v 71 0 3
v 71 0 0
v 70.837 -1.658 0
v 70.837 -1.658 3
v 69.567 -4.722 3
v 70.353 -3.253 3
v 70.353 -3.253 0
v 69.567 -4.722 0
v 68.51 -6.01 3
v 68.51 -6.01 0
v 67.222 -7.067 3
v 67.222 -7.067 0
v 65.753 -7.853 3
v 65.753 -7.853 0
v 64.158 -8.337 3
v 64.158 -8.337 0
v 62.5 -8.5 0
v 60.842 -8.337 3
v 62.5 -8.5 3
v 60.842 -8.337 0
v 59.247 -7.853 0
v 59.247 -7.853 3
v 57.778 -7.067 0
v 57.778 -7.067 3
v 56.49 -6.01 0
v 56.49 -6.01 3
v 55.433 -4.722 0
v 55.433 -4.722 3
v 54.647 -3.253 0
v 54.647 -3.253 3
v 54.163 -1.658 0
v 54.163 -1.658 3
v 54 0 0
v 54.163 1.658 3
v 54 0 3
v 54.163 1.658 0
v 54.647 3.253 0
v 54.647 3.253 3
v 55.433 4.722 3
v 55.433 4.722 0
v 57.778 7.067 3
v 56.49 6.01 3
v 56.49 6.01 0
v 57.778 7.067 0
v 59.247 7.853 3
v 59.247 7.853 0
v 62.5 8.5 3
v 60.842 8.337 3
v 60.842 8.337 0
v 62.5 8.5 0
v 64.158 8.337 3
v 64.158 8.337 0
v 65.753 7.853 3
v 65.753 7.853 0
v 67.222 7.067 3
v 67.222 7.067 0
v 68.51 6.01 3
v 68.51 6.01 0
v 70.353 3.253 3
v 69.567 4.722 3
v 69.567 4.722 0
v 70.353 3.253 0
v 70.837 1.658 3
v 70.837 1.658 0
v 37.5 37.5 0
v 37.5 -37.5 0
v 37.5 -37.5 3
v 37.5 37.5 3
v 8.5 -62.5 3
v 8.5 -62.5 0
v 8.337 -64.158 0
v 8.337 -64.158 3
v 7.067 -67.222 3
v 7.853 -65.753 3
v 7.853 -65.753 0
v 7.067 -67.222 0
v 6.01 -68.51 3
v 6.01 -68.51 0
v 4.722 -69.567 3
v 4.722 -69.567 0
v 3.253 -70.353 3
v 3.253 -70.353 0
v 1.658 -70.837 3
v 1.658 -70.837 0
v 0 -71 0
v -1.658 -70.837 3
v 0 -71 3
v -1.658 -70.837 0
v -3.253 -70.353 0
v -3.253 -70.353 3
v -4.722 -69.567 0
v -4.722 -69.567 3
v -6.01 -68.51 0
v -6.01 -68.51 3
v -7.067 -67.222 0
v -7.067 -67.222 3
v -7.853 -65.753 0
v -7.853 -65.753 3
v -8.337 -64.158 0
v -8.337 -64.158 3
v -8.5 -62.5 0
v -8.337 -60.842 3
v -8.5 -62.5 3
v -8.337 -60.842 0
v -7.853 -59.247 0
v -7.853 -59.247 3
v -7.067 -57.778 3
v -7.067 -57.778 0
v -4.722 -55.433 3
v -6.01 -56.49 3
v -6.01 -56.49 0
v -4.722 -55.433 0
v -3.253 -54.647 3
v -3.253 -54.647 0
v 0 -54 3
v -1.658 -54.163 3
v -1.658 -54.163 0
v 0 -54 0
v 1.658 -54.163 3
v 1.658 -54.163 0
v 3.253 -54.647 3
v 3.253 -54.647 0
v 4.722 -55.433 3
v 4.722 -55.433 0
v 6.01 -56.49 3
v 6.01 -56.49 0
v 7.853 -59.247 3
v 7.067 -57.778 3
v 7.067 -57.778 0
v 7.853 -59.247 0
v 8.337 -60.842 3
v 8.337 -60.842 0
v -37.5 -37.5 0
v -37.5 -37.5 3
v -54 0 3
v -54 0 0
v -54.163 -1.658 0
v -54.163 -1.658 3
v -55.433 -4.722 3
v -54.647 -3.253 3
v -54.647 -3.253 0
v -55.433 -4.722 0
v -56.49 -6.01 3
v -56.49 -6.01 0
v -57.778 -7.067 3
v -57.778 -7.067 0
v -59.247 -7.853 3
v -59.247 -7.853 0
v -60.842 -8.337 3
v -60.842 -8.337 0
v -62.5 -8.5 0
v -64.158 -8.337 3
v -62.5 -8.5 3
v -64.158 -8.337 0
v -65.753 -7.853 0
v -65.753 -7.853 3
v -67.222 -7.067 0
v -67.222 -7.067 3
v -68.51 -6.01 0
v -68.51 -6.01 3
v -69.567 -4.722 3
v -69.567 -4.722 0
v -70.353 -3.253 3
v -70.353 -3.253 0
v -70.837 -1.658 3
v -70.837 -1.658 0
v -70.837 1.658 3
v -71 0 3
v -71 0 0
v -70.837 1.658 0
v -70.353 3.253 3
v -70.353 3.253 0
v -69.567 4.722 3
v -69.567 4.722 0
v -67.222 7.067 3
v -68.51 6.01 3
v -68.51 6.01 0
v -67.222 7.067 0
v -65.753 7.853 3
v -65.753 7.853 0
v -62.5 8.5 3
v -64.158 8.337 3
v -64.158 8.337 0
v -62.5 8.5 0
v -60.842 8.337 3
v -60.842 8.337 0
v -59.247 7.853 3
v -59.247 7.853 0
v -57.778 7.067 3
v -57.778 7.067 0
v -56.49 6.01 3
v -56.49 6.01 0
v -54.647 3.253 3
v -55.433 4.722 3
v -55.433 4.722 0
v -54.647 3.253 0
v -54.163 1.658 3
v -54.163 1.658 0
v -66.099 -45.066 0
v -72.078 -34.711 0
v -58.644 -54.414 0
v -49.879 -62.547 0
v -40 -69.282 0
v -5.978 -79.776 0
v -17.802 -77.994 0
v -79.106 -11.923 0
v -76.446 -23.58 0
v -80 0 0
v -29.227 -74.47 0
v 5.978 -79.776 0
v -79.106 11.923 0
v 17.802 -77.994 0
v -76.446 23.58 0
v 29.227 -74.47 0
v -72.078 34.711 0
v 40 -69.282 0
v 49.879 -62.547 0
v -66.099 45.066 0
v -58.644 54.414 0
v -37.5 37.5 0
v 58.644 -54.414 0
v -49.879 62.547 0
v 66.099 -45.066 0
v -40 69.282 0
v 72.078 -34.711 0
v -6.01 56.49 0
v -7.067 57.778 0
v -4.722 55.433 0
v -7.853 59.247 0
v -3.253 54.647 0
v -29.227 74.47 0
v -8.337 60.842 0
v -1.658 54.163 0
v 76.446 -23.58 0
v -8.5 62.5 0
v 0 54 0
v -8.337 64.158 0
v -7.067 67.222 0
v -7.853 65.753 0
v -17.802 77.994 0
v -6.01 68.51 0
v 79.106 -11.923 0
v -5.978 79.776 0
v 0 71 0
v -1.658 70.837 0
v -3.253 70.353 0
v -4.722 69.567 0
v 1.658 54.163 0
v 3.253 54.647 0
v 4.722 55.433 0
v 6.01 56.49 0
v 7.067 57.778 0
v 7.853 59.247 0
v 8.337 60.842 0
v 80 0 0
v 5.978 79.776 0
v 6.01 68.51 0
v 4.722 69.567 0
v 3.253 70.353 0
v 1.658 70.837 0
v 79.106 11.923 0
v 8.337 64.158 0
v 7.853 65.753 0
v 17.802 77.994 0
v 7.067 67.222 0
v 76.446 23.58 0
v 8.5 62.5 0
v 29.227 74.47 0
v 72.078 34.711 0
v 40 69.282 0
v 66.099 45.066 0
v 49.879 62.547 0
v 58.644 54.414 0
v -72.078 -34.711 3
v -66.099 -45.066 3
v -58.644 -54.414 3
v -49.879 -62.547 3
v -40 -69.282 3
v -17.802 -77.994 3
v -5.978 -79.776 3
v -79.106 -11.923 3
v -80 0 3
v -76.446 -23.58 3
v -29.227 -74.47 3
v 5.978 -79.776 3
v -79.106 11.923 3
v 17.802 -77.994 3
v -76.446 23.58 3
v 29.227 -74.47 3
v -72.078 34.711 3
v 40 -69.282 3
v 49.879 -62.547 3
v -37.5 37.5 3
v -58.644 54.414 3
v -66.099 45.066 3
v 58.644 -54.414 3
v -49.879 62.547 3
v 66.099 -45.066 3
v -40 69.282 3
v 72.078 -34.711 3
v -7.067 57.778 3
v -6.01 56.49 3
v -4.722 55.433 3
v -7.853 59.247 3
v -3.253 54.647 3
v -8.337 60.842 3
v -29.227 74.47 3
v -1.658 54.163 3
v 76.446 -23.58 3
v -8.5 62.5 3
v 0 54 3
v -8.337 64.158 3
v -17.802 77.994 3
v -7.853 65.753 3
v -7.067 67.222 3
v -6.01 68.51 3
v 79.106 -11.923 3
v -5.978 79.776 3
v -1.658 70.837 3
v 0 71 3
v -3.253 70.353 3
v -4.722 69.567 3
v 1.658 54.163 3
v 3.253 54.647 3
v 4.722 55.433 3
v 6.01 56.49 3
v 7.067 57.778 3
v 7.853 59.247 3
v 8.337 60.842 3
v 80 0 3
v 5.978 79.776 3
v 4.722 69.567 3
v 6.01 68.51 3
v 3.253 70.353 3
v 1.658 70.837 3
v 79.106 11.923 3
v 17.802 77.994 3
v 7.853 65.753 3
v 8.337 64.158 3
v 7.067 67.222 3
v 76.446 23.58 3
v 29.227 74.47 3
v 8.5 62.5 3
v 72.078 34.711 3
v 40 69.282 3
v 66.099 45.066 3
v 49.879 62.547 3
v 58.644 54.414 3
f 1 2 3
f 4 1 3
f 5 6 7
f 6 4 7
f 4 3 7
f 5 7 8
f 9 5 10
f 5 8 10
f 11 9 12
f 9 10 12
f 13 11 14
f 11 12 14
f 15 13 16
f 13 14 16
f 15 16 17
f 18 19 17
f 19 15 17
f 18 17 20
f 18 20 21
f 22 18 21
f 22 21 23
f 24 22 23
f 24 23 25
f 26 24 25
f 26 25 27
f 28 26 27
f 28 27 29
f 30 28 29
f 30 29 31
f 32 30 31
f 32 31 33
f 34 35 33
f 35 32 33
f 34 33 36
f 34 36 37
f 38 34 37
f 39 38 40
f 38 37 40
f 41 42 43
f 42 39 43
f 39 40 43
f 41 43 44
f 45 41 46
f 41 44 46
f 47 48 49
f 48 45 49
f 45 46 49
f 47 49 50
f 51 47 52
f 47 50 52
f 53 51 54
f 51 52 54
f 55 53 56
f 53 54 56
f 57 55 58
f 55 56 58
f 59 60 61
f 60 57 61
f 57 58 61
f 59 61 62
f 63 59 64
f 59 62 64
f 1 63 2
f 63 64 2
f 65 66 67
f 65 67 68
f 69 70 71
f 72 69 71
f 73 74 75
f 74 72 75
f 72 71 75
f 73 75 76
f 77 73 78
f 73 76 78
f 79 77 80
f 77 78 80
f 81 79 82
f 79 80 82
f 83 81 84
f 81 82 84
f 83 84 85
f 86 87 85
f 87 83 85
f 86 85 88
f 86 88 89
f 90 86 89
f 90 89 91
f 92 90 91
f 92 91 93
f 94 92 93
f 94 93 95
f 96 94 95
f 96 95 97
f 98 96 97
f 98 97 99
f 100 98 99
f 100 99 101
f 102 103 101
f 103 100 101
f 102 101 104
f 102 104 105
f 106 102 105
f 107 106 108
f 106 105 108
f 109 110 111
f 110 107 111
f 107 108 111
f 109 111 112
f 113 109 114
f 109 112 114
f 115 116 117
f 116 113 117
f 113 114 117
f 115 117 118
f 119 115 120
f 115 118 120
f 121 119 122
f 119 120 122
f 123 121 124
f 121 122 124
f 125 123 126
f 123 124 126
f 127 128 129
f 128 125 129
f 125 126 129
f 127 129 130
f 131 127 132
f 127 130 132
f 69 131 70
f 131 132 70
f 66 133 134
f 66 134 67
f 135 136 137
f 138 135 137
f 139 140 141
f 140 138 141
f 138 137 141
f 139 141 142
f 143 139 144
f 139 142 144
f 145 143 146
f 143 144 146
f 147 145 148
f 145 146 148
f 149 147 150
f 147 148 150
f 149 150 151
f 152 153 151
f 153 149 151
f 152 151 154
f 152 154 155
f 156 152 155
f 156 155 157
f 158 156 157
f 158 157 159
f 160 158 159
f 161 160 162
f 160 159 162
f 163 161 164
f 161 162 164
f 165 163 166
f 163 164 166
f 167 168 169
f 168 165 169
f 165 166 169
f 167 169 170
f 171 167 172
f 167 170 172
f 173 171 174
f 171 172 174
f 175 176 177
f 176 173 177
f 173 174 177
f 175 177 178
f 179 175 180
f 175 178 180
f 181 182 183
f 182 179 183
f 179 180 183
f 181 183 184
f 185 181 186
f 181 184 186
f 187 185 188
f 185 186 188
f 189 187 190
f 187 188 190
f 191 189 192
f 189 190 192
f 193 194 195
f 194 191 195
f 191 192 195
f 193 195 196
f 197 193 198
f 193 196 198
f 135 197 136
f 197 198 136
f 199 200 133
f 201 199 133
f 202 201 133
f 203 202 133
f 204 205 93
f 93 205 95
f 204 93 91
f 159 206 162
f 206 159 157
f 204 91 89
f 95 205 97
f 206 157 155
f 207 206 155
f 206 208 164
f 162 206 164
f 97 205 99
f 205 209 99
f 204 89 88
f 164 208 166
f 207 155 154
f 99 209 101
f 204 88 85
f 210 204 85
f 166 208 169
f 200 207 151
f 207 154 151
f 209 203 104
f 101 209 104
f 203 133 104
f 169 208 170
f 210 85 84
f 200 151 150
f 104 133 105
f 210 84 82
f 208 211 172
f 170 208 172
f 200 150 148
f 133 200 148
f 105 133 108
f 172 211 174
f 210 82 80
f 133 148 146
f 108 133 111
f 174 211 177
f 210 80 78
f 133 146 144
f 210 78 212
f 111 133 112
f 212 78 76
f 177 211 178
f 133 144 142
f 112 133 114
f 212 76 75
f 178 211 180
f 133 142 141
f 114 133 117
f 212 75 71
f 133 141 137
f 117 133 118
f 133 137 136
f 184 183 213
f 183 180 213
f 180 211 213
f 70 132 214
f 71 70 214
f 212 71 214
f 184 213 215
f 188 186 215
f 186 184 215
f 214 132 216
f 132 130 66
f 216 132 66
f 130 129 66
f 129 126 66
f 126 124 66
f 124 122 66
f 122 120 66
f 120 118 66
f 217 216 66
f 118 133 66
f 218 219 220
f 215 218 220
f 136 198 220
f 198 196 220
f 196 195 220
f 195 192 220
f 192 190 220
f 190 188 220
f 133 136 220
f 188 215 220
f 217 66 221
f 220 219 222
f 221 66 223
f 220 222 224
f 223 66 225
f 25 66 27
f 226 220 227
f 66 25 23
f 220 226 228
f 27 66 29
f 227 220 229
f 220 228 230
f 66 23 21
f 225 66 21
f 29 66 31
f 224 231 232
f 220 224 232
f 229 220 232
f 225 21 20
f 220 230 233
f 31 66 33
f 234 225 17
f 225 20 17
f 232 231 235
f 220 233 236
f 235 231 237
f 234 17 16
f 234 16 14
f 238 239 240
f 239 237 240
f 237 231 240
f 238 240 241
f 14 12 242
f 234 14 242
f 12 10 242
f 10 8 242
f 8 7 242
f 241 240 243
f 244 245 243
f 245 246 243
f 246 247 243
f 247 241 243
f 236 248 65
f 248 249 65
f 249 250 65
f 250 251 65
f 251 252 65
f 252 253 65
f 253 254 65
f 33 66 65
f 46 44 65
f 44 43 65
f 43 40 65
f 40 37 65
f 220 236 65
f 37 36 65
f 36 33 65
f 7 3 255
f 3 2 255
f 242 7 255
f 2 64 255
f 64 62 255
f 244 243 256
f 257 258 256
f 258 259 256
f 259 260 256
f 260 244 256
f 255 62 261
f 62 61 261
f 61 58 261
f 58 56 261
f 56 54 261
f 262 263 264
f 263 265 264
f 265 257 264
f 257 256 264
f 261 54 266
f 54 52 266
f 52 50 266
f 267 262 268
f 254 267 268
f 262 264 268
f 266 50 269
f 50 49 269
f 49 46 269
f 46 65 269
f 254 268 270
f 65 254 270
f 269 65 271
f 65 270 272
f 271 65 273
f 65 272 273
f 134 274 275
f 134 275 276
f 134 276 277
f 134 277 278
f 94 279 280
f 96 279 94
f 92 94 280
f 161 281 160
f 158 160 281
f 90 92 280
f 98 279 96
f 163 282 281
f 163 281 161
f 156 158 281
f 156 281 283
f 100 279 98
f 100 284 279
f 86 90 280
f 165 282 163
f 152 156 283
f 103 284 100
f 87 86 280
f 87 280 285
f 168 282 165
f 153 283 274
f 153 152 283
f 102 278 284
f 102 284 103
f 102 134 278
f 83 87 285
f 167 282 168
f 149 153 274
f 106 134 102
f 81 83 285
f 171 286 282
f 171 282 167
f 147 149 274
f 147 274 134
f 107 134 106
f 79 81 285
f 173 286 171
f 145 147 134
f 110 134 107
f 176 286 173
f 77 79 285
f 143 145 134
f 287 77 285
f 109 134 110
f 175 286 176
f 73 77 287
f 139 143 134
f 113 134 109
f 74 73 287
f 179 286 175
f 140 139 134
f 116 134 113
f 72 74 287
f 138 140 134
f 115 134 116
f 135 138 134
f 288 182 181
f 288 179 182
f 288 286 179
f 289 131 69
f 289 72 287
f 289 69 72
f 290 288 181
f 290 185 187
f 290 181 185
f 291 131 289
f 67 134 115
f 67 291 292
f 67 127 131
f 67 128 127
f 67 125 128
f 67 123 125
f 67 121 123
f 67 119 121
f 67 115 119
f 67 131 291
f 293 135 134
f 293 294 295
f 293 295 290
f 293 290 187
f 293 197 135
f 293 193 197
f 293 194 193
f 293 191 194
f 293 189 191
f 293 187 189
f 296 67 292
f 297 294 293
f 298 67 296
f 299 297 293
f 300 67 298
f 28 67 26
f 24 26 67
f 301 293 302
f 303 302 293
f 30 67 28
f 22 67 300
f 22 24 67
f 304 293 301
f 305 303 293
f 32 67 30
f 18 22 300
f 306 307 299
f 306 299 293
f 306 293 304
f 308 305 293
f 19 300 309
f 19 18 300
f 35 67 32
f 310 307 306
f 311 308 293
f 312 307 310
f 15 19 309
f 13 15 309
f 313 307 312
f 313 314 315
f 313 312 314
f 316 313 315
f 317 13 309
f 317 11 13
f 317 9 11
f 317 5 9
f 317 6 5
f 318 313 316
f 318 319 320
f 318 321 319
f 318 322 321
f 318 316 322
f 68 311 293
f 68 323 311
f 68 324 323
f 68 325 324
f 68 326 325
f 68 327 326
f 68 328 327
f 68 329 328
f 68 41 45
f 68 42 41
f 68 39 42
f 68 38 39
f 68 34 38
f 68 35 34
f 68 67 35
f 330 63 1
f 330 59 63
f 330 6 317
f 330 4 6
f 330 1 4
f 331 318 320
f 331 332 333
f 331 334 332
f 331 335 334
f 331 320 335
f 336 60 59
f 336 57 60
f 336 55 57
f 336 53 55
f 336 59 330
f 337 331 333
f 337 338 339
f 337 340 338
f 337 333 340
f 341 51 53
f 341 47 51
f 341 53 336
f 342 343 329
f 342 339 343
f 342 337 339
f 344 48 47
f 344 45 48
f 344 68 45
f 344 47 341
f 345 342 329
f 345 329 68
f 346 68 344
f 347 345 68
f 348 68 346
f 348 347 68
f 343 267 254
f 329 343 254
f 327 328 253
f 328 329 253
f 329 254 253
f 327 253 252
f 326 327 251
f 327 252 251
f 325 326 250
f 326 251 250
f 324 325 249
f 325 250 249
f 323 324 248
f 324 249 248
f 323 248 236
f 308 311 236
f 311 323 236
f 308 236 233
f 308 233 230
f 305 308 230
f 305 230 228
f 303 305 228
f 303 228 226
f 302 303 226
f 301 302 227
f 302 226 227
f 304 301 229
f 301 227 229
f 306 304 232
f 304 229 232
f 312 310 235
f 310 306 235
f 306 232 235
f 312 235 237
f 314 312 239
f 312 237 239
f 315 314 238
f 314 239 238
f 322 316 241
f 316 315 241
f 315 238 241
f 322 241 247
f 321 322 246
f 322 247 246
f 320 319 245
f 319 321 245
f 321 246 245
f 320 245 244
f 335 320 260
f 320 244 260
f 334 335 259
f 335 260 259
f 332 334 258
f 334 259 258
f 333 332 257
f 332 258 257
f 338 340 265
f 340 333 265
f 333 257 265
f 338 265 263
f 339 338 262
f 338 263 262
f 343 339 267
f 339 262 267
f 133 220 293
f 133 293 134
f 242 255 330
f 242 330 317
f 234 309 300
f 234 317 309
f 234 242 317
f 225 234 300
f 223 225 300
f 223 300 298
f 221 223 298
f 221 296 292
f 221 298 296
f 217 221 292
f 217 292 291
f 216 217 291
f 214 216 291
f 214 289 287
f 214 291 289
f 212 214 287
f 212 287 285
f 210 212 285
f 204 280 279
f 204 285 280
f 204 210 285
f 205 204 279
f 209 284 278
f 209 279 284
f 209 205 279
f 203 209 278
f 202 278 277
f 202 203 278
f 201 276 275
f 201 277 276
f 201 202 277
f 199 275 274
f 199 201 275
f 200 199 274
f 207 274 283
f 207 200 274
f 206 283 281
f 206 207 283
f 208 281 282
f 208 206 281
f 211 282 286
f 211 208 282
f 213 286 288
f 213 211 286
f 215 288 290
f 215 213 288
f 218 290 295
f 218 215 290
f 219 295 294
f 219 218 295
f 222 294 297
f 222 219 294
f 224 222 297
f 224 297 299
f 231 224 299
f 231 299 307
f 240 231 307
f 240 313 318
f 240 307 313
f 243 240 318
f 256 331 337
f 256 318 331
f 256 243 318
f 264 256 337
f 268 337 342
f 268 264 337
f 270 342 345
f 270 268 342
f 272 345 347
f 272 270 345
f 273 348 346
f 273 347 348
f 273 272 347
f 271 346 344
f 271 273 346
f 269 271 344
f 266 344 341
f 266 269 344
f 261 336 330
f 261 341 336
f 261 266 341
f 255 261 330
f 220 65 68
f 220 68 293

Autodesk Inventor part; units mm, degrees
ref_plane "YZ Plane" through (0, 0, 0) normal (1, 0, 0) x (0, 1, 0)
ref_plane "XZ Plane" through (0, 0, 0) normal (0, 1, 0) x (-1, 0, 0)
ref_plane "XY Plane" through (0, 0, 0) normal (0, 0, 1) x (1, 0, 0)
sketch "Sketch1" plane through (0, 0, 0) normal (0, 0, 1) x (1, 0, 0)
  circle A0 centre (0, 0) radius 80
  line L0 (37.5, 37.5) -> (-37.5, 37.5)
  line L1 (-37.5, 37.5) -> (-37.5, -37.5)
  line L2 (-37.5, -37.5) -> (37.5, -37.5)
  line L3 (37.5, -37.5) -> (37.5, 37.5)
  line L4 (37.5, 37.5) -> (-37.5, -37.5) construction
  line L5 (-37.5, 37.5) -> (37.5, -37.5) construction
  circle A1 centre (0, 0) radius 62.5 construction
  circle A2 centre (-62.5, 0) radius 8.5
  circle A3 centre (0, -62.5) radius 8.5
  circle A4 centre (62.5, 0) radius 8.5
  circle A5 centre (0, 62.5) radius 8.5
  dimension "d171" = 125
  dimension "d157" = 160
  dimension "d158" = 75
  dimension "d176" = 17
  dimension "d179" = 360
extrude "Plate5" add sketch "Sketch1" along normal blind 3
properties part number "PRS-1651 FDS MAIN  FLANGE_CPY" material "Stainless Steel"
